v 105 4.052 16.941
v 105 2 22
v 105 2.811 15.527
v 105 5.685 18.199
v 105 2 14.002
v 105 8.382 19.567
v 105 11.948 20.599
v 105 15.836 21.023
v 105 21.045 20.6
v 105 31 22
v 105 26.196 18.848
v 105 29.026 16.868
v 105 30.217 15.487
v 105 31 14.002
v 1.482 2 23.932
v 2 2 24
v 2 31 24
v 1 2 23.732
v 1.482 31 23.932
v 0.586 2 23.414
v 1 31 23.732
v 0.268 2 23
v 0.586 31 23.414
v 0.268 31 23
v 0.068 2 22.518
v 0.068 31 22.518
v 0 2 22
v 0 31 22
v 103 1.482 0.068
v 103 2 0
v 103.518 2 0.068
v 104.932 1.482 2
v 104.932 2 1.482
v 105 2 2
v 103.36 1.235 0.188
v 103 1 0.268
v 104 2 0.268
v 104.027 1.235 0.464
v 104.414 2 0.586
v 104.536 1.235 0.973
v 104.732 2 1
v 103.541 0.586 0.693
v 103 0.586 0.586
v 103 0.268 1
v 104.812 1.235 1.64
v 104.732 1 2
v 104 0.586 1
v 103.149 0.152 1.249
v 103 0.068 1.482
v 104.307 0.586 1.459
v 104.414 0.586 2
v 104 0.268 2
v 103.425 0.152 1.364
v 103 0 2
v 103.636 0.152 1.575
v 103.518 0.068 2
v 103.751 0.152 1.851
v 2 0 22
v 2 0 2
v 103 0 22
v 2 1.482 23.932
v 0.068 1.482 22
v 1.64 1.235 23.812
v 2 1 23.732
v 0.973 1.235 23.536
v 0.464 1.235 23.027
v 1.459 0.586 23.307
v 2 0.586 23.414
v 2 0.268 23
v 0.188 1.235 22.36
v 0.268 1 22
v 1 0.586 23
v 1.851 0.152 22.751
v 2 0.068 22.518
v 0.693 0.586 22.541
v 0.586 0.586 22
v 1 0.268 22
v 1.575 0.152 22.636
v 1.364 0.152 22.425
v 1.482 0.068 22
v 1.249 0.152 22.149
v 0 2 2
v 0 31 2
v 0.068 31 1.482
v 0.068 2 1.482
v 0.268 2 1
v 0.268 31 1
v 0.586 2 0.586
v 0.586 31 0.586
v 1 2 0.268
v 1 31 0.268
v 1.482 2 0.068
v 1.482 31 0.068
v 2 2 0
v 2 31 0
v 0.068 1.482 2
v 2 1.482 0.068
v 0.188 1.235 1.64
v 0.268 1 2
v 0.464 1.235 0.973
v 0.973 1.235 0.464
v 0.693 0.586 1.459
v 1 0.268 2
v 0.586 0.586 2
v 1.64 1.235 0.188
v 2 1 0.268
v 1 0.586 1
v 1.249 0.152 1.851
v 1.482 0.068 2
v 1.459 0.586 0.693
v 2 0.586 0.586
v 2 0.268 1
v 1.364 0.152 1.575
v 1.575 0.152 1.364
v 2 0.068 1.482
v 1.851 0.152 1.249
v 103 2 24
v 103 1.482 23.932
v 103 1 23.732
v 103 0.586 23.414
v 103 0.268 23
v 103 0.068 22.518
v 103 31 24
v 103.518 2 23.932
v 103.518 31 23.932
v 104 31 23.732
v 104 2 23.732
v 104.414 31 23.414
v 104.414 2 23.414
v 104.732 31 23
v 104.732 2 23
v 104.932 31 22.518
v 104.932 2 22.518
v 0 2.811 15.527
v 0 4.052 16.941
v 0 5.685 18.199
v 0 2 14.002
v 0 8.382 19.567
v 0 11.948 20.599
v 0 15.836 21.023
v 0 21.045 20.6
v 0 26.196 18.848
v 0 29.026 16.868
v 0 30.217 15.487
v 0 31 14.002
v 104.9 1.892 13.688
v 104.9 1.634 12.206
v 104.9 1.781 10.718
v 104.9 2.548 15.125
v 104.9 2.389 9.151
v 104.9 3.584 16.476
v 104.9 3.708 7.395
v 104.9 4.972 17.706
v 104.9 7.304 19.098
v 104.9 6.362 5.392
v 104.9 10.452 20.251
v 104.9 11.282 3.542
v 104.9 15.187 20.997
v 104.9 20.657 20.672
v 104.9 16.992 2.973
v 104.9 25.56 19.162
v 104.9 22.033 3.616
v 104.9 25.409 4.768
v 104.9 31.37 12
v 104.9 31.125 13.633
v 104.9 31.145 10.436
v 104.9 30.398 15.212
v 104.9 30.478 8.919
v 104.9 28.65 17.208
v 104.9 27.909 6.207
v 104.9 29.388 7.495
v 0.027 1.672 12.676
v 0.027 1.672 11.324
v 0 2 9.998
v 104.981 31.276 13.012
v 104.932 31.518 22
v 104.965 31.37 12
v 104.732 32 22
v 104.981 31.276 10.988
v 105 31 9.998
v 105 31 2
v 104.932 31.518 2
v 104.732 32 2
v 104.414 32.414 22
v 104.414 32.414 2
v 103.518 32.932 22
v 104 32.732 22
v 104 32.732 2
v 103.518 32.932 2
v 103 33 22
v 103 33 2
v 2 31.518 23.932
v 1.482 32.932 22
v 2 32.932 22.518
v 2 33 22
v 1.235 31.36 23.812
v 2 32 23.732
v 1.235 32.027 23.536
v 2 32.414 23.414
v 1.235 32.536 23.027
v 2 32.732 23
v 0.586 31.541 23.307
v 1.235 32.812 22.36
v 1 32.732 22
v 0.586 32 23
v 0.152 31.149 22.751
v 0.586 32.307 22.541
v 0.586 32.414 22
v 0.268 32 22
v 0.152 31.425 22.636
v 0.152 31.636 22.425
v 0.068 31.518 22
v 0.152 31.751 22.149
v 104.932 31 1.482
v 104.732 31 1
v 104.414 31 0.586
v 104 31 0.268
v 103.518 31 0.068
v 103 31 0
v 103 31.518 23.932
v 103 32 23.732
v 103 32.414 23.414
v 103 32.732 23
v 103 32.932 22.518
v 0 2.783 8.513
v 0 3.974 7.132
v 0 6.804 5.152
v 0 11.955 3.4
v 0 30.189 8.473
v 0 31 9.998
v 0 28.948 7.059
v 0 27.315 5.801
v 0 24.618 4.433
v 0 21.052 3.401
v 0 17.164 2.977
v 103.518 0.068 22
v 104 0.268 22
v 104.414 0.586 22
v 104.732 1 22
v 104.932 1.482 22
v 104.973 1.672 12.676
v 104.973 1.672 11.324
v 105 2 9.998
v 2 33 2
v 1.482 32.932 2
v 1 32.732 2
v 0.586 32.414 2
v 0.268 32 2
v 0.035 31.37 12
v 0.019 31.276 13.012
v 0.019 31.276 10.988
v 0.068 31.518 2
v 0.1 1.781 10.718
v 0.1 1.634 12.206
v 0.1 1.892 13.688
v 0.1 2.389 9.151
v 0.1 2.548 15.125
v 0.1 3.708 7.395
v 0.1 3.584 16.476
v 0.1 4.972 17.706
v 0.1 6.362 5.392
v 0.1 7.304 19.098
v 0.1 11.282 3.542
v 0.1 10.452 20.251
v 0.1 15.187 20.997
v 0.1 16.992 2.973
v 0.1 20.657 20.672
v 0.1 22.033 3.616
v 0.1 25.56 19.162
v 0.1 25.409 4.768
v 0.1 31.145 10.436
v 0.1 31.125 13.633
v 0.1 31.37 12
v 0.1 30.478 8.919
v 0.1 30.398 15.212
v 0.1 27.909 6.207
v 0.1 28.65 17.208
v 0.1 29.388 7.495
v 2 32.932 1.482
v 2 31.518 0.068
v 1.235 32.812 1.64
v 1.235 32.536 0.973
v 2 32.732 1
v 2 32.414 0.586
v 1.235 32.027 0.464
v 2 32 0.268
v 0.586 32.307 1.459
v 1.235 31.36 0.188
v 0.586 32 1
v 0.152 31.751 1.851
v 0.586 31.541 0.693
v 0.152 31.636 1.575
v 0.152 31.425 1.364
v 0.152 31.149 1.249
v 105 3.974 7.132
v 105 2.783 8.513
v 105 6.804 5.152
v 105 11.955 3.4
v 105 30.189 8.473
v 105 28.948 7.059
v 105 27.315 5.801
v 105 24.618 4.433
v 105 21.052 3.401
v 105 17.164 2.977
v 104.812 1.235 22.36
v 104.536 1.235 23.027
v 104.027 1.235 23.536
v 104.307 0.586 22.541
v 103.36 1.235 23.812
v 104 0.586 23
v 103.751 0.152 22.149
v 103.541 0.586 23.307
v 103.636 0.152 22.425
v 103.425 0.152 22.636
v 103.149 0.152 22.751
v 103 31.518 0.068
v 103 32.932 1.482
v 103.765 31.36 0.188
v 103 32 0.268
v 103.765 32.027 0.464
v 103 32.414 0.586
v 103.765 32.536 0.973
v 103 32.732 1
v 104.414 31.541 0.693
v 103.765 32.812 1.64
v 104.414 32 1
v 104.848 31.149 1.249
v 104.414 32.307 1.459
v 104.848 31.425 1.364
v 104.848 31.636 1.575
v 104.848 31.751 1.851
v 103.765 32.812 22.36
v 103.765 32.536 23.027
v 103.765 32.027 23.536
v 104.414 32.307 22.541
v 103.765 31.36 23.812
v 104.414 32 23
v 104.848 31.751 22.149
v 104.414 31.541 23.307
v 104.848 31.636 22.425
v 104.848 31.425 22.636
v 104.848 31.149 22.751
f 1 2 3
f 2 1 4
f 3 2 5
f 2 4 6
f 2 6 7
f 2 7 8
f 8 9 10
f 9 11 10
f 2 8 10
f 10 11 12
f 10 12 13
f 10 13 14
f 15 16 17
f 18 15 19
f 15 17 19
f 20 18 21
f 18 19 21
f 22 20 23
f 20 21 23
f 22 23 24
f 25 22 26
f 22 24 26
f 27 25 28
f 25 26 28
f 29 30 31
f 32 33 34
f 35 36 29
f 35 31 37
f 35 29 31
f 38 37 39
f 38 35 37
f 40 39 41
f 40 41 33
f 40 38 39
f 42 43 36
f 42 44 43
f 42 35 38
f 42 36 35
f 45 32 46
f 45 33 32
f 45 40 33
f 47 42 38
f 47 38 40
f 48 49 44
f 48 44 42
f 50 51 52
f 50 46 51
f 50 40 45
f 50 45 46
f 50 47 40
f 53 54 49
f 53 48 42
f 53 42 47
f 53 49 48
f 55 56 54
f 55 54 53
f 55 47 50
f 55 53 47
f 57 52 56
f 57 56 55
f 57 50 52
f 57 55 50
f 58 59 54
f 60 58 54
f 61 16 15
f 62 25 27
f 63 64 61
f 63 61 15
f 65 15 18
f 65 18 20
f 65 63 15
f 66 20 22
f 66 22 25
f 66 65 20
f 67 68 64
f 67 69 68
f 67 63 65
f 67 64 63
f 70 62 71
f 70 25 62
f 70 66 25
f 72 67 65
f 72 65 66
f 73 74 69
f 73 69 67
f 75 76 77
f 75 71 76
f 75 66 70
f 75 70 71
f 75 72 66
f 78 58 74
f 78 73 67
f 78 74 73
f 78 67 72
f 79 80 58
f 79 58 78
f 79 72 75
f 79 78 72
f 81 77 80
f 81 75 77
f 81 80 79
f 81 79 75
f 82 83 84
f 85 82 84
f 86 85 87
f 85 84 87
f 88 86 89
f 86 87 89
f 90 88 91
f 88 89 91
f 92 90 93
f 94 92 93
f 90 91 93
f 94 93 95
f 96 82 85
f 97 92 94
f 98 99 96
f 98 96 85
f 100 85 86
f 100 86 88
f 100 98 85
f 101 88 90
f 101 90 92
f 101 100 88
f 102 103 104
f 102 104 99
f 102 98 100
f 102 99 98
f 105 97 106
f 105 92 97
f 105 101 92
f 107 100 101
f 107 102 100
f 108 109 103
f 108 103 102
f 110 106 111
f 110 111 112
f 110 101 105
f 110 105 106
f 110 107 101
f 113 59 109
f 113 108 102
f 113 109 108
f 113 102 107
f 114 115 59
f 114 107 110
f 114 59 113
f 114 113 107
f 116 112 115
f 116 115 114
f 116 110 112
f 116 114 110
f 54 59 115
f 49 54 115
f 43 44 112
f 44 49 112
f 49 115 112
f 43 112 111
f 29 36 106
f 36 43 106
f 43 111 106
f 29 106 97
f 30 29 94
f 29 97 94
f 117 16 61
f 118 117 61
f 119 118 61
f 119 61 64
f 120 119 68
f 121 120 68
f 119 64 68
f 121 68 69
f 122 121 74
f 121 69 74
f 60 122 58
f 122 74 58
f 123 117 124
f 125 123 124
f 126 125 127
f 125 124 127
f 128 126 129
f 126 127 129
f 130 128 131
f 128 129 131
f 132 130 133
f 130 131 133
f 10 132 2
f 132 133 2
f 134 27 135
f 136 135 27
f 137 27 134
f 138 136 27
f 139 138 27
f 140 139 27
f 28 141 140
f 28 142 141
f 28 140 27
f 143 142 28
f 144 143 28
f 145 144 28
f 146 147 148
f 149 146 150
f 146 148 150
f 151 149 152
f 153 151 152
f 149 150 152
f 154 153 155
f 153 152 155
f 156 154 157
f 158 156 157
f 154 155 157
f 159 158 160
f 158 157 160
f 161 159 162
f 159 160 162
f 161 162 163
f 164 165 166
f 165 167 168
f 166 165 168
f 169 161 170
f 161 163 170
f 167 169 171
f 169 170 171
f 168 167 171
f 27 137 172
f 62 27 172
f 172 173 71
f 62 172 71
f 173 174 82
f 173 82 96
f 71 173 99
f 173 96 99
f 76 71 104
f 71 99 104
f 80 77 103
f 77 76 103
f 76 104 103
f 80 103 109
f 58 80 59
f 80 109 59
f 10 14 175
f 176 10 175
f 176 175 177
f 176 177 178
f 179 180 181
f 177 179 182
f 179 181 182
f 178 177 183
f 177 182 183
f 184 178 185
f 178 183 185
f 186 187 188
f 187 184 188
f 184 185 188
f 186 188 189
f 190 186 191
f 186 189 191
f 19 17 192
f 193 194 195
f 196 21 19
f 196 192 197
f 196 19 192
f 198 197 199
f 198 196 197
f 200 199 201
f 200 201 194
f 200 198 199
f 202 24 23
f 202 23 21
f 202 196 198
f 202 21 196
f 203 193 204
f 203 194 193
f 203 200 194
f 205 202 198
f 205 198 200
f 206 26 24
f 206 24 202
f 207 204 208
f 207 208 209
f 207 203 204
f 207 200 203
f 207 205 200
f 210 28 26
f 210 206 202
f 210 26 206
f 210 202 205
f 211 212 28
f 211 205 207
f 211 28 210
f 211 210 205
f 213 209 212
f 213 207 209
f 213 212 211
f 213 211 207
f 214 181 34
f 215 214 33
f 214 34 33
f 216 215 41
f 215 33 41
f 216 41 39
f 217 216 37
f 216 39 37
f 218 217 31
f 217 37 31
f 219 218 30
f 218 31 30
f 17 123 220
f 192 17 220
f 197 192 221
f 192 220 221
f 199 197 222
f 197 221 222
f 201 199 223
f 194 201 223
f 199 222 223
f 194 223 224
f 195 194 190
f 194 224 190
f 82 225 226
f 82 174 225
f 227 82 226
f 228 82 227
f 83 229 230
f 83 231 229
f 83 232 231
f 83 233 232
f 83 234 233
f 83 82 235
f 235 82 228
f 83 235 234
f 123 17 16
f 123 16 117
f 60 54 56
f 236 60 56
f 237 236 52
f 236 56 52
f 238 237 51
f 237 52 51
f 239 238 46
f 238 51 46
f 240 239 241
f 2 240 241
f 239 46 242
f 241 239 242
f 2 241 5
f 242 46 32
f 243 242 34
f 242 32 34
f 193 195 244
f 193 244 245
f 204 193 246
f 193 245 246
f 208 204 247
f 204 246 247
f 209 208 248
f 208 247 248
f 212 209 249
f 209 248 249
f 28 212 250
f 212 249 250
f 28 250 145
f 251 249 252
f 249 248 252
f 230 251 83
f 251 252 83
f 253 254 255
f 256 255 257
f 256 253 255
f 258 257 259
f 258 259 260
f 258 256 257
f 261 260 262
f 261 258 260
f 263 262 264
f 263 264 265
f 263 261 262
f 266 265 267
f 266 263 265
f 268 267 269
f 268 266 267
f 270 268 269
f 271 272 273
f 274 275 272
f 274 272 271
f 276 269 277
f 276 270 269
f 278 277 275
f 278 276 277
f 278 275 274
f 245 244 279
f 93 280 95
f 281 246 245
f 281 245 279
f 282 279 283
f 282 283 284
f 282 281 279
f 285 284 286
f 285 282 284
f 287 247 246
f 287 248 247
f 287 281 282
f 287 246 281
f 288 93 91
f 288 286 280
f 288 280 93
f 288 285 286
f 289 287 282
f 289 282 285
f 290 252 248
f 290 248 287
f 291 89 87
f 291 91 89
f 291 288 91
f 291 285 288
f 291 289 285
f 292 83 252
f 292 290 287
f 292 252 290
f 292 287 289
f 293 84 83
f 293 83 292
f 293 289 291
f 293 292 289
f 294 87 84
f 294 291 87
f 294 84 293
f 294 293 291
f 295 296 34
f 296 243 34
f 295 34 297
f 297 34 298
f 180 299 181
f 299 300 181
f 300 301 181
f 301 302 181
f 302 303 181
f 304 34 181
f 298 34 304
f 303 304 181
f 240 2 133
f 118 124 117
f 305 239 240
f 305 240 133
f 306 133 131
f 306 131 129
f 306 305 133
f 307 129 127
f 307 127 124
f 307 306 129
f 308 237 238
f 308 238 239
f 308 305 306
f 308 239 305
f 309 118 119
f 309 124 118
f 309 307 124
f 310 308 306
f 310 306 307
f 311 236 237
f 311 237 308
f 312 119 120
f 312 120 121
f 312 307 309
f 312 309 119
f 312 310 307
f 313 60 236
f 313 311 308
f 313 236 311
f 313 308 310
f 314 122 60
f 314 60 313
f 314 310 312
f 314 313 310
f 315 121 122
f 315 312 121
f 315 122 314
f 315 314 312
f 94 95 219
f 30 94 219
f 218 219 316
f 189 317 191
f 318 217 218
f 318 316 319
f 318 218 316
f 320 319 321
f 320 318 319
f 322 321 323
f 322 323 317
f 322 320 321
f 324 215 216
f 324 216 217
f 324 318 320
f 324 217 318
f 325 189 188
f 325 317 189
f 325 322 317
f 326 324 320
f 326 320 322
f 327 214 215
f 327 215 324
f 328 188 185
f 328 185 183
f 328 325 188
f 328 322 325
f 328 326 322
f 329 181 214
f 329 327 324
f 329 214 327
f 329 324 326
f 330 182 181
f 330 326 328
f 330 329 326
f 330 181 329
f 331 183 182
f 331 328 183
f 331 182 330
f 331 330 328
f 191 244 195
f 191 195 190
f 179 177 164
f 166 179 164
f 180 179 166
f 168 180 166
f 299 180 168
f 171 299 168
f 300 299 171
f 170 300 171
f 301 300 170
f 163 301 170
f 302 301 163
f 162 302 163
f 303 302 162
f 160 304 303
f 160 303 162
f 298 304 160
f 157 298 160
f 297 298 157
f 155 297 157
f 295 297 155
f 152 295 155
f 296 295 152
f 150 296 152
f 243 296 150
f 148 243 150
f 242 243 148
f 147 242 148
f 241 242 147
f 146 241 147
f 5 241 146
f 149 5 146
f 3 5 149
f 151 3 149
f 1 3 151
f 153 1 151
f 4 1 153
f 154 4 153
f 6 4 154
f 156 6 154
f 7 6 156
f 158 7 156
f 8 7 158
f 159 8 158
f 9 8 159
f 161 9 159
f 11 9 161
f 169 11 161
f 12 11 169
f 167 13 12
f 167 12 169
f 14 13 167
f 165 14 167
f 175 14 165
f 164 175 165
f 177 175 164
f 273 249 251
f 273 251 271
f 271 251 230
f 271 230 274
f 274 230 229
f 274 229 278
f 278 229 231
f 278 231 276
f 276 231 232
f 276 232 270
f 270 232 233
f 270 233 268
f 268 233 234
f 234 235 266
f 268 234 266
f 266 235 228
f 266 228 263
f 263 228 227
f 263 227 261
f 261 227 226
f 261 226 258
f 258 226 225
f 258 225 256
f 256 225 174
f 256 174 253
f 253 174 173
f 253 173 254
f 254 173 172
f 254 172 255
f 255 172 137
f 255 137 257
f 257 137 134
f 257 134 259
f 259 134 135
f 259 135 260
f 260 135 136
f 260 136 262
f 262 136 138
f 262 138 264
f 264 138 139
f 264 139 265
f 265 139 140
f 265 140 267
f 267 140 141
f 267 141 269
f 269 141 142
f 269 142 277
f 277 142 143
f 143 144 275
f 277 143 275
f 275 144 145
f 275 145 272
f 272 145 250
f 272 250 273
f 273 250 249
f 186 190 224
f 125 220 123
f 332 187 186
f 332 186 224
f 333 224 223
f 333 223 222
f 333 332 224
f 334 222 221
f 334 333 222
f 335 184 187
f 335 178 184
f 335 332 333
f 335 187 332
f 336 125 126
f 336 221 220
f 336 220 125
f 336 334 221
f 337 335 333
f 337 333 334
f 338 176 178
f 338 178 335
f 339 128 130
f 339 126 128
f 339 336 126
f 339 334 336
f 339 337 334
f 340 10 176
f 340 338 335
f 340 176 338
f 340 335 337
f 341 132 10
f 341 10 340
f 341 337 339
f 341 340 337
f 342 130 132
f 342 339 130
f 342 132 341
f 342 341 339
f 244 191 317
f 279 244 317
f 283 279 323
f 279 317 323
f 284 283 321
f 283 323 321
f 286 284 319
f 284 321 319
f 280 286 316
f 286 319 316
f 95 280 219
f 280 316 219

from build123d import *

# Parameters (mm, degrees)
ESQUISSE1_W             = 105
ESQUISSE1_H             = 33
BOSS_EXTRU_1_DEPTH      = 24
ESQUISSE2_RX            = 14.870046763
ESQUISSE2_RY            = 9.032322921
ENL_V_MAT_EXTRU_1_DEPTH = 0.1
CONG_1_R                = 2


with BuildPart() as part:
    # Esquisse1 → Boss.-Extru.1 (new body)
    with BuildSketch(Plane.XY):
        with Locations((52.5, 16.5)):
            Rectangle(ESQUISSE1_W, ESQUISSE1_H)
    extrude(amount=BOSS_EXTRU_1_DEPTH)

    # Esquisse2 → Enlèv. mat.-Extru.1 (cut)
    with BuildSketch(Plane.ZY):
        with Locations(Location((12, 16.5), (0, 0, 90))):
            Ellipse(ESQUISSE2_RX, ESQUISSE2_RY)
    enl_v_mat_extru_1 = extrude(amount=-ENL_V_MAT_EXTRU_1_DEPTH, mode=Mode.SUBTRACT)

    # Symétrie1: Enlèv. mat.-Extru.1 across plane
    add(enl_v_mat_extru_1.mirror(Plane.ZY.offset(-52.5)), mode=Mode.SUBTRACT)

    # Congé1
    # the kernel refuses this fillet: 2 mm, written as the material it takes off along each edge
    with BuildSketch(Plane(origin=(103, 2, 22), x_dir=(1, 0, 0), z_dir=(0, -1, 0))) as cong_1_piece_1_section:
        Polygon((0, 0), (CONG_1_R, 0), (CONG_1_R, CONG_1_R), (0, CONG_1_R), align=None)
    cong_1_piece_1 = extrude(amount=CONG_1_R, mode=Mode.PRIVATE)
    cong_1_piece_1 = cong_1_piece_1 - Plane(origin=(103, 2, 22), x_dir=(-0.7071067811865475, 0, -0.7071067811865475), z_dir=(0, -1, 0)) * Sphere(CONG_1_R, mode=Mode.PRIVATE)
    add(cong_1_piece_1, mode=Mode.SUBTRACT)
    with BuildSketch(Plane(origin=(103, 31, 22), x_dir=(0, 0, 1), z_dir=(1, 0, 0))) as cong_1_piece_2_section:
        Polygon((0, 0), (CONG_1_R, 0), (CONG_1_R, -CONG_1_R), (0, -CONG_1_R), align=None)
    cong_1_piece_2 = extrude(amount=CONG_1_R, mode=Mode.PRIVATE)
    cong_1_piece_2 = cong_1_piece_2 - Plane(origin=(103, 31, 22), x_dir=(0, -0.7071067811865475, -0.7071067811865475), z_dir=(1, 0, 0)) * Sphere(CONG_1_R, mode=Mode.PRIVATE)
    add(cong_1_piece_2, mode=Mode.SUBTRACT)
    with BuildSketch(Plane(origin=(2, 31, 22), x_dir=(0, 0, 1), z_dir=(-1, 0, 0))) as cong_1_piece_3_section:
        Polygon((0, 0), (CONG_1_R, 0), (CONG_1_R, CONG_1_R), (0, CONG_1_R), align=None)
    cong_1_piece_3 = extrude(amount=CONG_1_R, mode=Mode.PRIVATE)
    cong_1_piece_3 = cong_1_piece_3 - Plane(origin=(2, 31, 22), x_dir=(0, -0.7071067811865475, -0.7071067811865475), z_dir=(-1, 0, 0)) * Sphere(CONG_1_R, mode=Mode.PRIVATE)
    add(cong_1_piece_3, mode=Mode.SUBTRACT)
    with BuildSketch(Plane(origin=(2, 2, 22), x_dir=(-1, 0, 0), z_dir=(0, -1, 0))) as cong_1_piece_4_section:
        Polygon((0, 0), (CONG_1_R, 0), (CONG_1_R, -CONG_1_R), (0, -CONG_1_R), align=None)
    cong_1_piece_4 = extrude(amount=CONG_1_R, mode=Mode.PRIVATE)
    cong_1_piece_4 = cong_1_piece_4 - Plane(origin=(2, 2, 22), x_dir=(0.7071067811865475, 0, -0.7071067811865475), z_dir=(0, -1, 0)) * Sphere(CONG_1_R, mode=Mode.PRIVATE)
    add(cong_1_piece_4, mode=Mode.SUBTRACT)
    with BuildSketch(Plane(origin=(103, 31, 2), x_dir=(0, 0, -1), z_dir=(1, 0, 0))) as cong_1_piece_5_section:
        Polygon((0, 0), (CONG_1_R, 0), (CONG_1_R, CONG_1_R), (0, CONG_1_R), align=None)
    cong_1_piece_5 = extrude(amount=CONG_1_R, mode=Mode.PRIVATE)
    cong_1_piece_5 = cong_1_piece_5 - Plane(origin=(103, 31, 2), x_dir=(0, -0.7071067811865475, 0.7071067811865475), z_dir=(1, 0, 0)) * Sphere(CONG_1_R, mode=Mode.PRIVATE)
    add(cong_1_piece_5, mode=Mode.SUBTRACT)
    with BuildSketch(Plane(origin=(2, 31, 2), x_dir=(0, 0, -1), z_dir=(-1, 0, 0))) as cong_1_piece_6_section:
        Polygon((0, 0), (CONG_1_R, 0), (CONG_1_R, -CONG_1_R), (0, -CONG_1_R), align=None)
    cong_1_piece_6 = extrude(amount=CONG_1_R, mode=Mode.PRIVATE)
    cong_1_piece_6 = cong_1_piece_6 - Plane(origin=(2, 31, 2), x_dir=(0, -0.7071067811865475, 0.7071067811865475), z_dir=(-1, 0, 0)) * Sphere(CONG_1_R, mode=Mode.PRIVATE)
    add(cong_1_piece_6, mode=Mode.SUBTRACT)
    with BuildSketch(Plane(origin=(103, 2, 2), x_dir=(1, 0, 0), z_dir=(0, -1, 0))) as cong_1_piece_7_section:
        Polygon((0, 0), (CONG_1_R, 0), (CONG_1_R, -CONG_1_R), (0, -CONG_1_R), align=None)
    cong_1_piece_7 = extrude(amount=CONG_1_R, mode=Mode.PRIVATE)
    cong_1_piece_7 = cong_1_piece_7 - Plane(origin=(103, 2, 2), x_dir=(-0.7071067811865475, 0, 0.7071067811865475), z_dir=(0, -1, 0)) * Sphere(CONG_1_R, mode=Mode.PRIVATE)
    add(cong_1_piece_7, mode=Mode.SUBTRACT)
    with BuildSketch(Plane(origin=(2, 2, 2), x_dir=(-1, 0, 0), z_dir=(0, -1, 0))) as cong_1_piece_8_section:
        Polygon((0, 0), (CONG_1_R, 0), (CONG_1_R, CONG_1_R), (0, CONG_1_R), align=None)
    cong_1_piece_8 = extrude(amount=CONG_1_R, mode=Mode.PRIVATE)
    cong_1_piece_8 = cong_1_piece_8 - Plane(origin=(2, 2, 2), x_dir=(0.7071067811865475, 0, 0.7071067811865475), z_dir=(0, -1, 0)) * Sphere(CONG_1_R, mode=Mode.PRIVATE)
    add(cong_1_piece_8, mode=Mode.SUBTRACT)
    with BuildSketch(Plane(origin=(105, 2, 24), x_dir=(0, 0, -1), z_dir=(0, 1, 0)), Plane(origin=(0, 31, 24), x_dir=(0, 0, -1), z_dir=(0, -1, 0))) as cong_1_piece_9:
        with BuildLine():
            CenterArc((CONG_1_R, CONG_1_R), CONG_1_R, 180, 90)
            Line((0, CONG_1_R), (0, 0))
            Line((0, 0), (CONG_1_R, 0))
        make_face()
    extrude(amount=29, mode=Mode.SUBTRACT)
    with BuildSketch(Plane(origin=(103, 33, 24), x_dir=(0, -1, 0), z_dir=(-1, 0, 0)), Plane(origin=(2, 0, 0), x_dir=(0, 0, 1), z_dir=(1, 0, 0))) as cong_1_piece_10:
        with BuildLine():
            CenterArc((CONG_1_R, -CONG_1_R), CONG_1_R, 90, 90)
            Line((0, -CONG_1_R), (0, 0))
            Line((0, 0), (CONG_1_R, 0))
        make_face()
    extrude(amount=101, mode=Mode.SUBTRACT)
    with BuildSketch(Plane(origin=(103, 33, 0), x_dir=(0, -1, 0), z_dir=(-1, 0, 0)), Plane(origin=(2, 0, 24), x_dir=(0, 0, -1), z_dir=(1, 0, 0))) as cong_1_piece_11:
        with BuildLine():
            CenterArc((CONG_1_R, CONG_1_R), CONG_1_R, 180, 90)
            Line((0, CONG_1_R), (0, 0))
            Line((0, 0), (CONG_1_R, 0))
        make_face()
    extrude(amount=101, mode=Mode.SUBTRACT)
    with BuildSketch(Plane(origin=(105, 2, 0), x_dir=(0, 0, 1), z_dir=(0, 1, 0)), Plane(origin=(0, 31, 0), x_dir=(0, 0, 1), z_dir=(0, -1, 0))) as cong_1_piece_12:
        with BuildLine():
            CenterArc((CONG_1_R, -CONG_1_R), CONG_1_R, 90, 90)
            Line((0, -CONG_1_R), (0, 0))
            Line((0, 0), (CONG_1_R, 0))
        make_face()
    extrude(amount=29, mode=Mode.SUBTRACT)
    with BuildSketch(Plane(origin=(0, 33, 2), x_dir=(0, -1, 0), z_dir=(0, 0, 1)), Plane(origin=(0, 0, 2), x_dir=(1, 0, 0), z_dir=(0, 0, 1))) as cong_1_piece_13:
        with BuildLine():
            CenterArc((CONG_1_R, CONG_1_R), CONG_1_R, 180, 90)
            Line((0, CONG_1_R), (0, 0))
            Line((0, 0), (CONG_1_R, 0))
        make_face()
    extrude(amount=20, mode=Mode.SUBTRACT)
    with BuildSketch(Plane(origin=(105, 33, 2), x_dir=(0, -1, 0), z_dir=(0, 0, 1)), Plane(origin=(105, 0, 2), x_dir=(-1, 0, 0), z_dir=(0, 0, 1))) as cong_1_piece_14:
        with BuildLine():
            CenterArc((CONG_1_R, -CONG_1_R), CONG_1_R, 90, 90)
            Line((0, -CONG_1_R), (0, 0))
            Line((0, 0), (CONG_1_R, 0))
        make_face()
    extrude(amount=20, mode=Mode.SUBTRACT)


solid = part.part
